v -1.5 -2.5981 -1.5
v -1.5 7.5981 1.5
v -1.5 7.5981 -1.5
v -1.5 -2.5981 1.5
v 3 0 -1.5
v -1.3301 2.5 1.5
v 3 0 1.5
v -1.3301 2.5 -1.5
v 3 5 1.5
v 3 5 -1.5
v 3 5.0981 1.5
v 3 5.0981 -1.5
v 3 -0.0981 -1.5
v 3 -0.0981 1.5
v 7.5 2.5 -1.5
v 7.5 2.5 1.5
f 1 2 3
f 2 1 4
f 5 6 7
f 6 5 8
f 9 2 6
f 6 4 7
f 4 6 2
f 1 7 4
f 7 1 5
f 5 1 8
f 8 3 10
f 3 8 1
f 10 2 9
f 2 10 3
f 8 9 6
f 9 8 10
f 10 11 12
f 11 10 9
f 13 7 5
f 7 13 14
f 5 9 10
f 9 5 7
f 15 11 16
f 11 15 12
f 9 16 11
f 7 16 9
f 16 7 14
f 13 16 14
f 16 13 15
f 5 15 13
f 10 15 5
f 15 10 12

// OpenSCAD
color("khaki")
cylinder(h=3,r=3,$fn=3, center=true);
translate([0, 5, 0])
color("khaki")
cylinder(h=3,r=3,$fn=3, center=true);
translate([4.5, 2.5, 0])
color("khaki")
cylinder(h=3,r=3,$fn=3, center=true);
